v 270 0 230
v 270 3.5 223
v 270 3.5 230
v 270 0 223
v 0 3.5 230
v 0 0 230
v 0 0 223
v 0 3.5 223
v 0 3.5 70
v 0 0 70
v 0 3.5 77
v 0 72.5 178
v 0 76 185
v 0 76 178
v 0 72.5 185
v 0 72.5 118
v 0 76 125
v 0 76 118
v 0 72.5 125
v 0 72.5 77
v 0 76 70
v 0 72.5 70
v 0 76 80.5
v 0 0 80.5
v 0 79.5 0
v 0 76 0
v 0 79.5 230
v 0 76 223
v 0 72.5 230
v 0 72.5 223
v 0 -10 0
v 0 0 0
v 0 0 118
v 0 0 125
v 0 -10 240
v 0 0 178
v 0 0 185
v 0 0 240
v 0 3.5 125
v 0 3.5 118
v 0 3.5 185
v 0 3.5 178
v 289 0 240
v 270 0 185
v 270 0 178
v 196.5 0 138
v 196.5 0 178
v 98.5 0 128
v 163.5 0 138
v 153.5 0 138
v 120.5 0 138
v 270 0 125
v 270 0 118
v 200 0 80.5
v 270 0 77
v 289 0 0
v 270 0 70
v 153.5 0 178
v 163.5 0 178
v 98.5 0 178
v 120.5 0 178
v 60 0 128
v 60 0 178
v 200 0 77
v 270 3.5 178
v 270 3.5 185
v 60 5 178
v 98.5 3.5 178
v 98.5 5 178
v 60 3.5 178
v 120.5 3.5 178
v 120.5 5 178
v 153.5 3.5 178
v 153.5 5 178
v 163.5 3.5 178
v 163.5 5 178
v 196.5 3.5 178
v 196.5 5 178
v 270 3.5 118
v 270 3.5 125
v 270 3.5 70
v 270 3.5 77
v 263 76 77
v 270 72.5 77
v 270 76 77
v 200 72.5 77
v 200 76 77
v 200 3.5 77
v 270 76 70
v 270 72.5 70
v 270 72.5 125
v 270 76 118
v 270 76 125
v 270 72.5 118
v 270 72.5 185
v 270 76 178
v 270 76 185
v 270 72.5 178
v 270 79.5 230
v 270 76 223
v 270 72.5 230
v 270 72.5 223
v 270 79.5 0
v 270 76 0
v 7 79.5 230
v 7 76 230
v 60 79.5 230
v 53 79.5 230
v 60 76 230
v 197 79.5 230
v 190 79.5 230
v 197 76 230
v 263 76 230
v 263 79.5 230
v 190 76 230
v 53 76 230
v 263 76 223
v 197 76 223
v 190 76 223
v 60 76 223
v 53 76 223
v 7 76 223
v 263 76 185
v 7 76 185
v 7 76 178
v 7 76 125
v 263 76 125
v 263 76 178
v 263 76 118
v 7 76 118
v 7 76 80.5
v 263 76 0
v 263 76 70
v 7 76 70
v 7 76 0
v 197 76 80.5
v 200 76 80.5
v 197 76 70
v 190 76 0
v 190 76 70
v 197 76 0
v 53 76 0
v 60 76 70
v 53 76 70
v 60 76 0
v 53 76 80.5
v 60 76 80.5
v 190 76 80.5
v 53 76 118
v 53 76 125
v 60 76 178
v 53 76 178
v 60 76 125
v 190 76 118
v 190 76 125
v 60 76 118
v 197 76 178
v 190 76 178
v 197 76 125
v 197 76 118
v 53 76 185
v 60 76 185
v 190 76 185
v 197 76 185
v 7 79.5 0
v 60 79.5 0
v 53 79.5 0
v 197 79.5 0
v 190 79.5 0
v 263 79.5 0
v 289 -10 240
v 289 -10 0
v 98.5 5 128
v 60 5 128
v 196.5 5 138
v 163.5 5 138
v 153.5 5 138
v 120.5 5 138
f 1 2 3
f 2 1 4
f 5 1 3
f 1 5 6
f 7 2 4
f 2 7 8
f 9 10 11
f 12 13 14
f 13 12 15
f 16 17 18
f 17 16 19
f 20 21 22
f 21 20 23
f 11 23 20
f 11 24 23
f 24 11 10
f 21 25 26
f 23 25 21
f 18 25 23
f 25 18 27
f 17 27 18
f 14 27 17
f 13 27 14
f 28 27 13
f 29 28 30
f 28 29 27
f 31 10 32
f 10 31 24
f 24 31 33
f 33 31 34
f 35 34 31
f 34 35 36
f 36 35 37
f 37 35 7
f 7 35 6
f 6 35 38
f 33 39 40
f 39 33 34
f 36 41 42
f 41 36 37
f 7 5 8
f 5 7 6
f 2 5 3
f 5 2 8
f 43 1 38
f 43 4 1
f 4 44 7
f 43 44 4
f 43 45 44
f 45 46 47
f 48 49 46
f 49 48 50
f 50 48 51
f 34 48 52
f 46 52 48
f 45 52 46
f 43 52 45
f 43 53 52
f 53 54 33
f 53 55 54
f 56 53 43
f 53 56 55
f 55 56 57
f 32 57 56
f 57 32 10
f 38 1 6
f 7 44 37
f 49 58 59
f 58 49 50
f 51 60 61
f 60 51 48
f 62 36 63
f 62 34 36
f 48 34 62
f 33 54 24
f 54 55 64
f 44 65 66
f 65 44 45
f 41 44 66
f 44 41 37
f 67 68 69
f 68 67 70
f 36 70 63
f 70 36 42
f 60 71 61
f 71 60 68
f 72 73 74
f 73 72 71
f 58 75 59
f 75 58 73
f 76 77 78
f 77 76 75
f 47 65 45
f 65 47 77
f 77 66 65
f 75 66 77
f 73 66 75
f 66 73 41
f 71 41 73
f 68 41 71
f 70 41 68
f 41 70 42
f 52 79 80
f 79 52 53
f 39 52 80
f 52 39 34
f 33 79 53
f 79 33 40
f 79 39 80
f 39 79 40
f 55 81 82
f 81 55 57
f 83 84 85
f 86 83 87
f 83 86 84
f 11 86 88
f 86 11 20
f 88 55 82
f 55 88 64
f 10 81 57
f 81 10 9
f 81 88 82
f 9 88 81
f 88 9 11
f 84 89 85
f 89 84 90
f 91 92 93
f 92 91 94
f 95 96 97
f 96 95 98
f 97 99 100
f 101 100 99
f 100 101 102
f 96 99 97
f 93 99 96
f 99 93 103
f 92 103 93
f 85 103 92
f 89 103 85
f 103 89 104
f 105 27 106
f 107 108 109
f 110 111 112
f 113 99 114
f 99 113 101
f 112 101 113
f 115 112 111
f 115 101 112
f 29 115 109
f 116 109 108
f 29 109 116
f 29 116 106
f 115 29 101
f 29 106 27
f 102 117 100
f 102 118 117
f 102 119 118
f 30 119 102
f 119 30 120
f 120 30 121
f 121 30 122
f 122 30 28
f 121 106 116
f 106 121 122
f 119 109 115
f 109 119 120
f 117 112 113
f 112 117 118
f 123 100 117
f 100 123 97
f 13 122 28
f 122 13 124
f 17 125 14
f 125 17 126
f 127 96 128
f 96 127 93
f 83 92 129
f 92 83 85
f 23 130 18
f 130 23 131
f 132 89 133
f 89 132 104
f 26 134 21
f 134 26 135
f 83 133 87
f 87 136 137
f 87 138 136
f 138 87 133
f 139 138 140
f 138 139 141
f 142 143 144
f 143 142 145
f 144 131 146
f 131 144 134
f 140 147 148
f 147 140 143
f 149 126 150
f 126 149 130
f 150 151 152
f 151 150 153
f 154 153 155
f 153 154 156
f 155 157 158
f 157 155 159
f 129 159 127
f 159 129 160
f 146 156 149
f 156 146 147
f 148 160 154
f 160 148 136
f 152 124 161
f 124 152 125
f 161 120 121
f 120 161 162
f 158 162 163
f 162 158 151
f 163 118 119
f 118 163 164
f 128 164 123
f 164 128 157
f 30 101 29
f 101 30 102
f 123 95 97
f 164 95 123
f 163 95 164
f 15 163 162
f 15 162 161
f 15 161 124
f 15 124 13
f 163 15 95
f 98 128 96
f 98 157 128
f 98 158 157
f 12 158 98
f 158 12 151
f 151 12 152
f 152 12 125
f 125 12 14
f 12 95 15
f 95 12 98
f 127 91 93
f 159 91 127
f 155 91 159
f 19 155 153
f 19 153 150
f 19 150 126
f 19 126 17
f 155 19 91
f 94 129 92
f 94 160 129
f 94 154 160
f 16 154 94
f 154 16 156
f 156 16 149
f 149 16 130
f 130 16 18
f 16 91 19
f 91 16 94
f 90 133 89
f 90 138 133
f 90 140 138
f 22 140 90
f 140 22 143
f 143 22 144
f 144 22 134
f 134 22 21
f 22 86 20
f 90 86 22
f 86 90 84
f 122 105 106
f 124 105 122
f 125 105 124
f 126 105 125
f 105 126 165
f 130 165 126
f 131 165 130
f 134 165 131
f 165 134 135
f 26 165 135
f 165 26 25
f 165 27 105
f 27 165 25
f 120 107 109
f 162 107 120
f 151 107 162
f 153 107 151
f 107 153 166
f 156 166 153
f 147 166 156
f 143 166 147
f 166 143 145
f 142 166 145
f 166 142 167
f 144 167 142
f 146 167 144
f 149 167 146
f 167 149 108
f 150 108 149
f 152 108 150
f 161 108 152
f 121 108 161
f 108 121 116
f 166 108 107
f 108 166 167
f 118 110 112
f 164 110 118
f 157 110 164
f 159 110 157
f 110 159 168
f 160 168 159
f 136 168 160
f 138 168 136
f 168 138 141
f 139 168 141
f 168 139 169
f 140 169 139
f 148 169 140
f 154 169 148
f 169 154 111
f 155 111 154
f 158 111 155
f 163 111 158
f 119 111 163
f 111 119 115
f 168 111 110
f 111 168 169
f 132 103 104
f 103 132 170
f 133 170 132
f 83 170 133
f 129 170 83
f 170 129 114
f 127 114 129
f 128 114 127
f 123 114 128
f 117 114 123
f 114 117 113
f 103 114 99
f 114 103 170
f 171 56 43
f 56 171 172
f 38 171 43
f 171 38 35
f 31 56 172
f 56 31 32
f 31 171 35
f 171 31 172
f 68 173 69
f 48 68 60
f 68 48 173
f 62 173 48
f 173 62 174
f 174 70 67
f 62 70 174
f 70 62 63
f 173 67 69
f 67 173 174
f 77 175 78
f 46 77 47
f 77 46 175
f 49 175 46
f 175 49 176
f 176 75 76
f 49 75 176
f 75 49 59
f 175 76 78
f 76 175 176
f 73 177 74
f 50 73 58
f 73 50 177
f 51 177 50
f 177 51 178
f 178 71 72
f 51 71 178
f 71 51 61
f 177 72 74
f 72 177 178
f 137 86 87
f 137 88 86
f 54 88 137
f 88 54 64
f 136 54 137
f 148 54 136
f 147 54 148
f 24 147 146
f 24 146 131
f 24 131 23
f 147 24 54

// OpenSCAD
//unit: cm

size_a = 7;
size_b = 3.5;

panel_width = 76;
support_length = panel_width - size_b * 2;

ceiling_height = 272;
wall_width = 289;
wall_height = 240;

shelf_height = 230;  //?
shelf_width = 270;  //?
left_offset = 200;
bottom_row_height = 70;


ebox_large_x = 60;
ebox_large_h = 50;
ebox_large_w = 38.5;
ebox_large_z = 128;
ebox_top_z = ebox_large_z + ebox_large_h; // 178

ebox_offset = 92.5;
ebox_w = 33;
ebox_h = 40;

column_left_offset = 80;
column_right_offset = ebox_large_x - size_a;

module person() {
    color("purple") translate([shelf_width/2, panel_width + 30, 0]) cylinder(r=20, h=165);
}

module wall() {
    translate([0,-10,0]) cube([wall_width, 10, wall_height]);
}

module door() {
    color("white") translate([0,0,bottom_row_height+size_a]) cube([200, 76, 3.5]);
}

module ebox_large() {
    color("yellow") translate([ebox_large_x, 0, ebox_top_z - ebox_large_h]) cube([ebox_large_w, 5, ebox_large_h]);
}

module ebox_small_1() {
    color("yellow") translate([wall_width - ebox_offset - ebox_w, 0, ebox_top_z - ebox_h]) cube([ebox_w, 5, ebox_h]);
}

module ebox_small_2() {
    translate([-(ebox_w+10),0,0]) ebox_small_1();
}

module row(width=shelf_width) {
    color("blue") cube([width, size_b, size_a]);
}

module rows_back() {
    translate([0, 0, shelf_height - size_a]) row();
    translate([0, 0, ebox_large_z + ebox_large_h]) row();
    translate([0, 0, ebox_large_z - size_a - 3]) row(); // panel thickness 2
    translate([0, 0, bottom_row_height]) row();
}

module rows_front() {
    color("green") translate([0, size_b + support_length, 0]) rows_back();
}

module column() {
    color("red") translate([0, size_b * 2 + support_length]) cube([size_a, size_b, shelf_height]);
}

module columns() {
    column();
    translate([ebox_large_x - size_a, 0, 0]) column();
    translate([shelf_width - column_left_offset, 0, 0]) column();
    translate([shelf_width - size_a, 0, 0]) column();
}

wall();
// person();

ebox_large();
ebox_small_1();
ebox_small_2();
rows_back();

rows_front();
door();
columns();
